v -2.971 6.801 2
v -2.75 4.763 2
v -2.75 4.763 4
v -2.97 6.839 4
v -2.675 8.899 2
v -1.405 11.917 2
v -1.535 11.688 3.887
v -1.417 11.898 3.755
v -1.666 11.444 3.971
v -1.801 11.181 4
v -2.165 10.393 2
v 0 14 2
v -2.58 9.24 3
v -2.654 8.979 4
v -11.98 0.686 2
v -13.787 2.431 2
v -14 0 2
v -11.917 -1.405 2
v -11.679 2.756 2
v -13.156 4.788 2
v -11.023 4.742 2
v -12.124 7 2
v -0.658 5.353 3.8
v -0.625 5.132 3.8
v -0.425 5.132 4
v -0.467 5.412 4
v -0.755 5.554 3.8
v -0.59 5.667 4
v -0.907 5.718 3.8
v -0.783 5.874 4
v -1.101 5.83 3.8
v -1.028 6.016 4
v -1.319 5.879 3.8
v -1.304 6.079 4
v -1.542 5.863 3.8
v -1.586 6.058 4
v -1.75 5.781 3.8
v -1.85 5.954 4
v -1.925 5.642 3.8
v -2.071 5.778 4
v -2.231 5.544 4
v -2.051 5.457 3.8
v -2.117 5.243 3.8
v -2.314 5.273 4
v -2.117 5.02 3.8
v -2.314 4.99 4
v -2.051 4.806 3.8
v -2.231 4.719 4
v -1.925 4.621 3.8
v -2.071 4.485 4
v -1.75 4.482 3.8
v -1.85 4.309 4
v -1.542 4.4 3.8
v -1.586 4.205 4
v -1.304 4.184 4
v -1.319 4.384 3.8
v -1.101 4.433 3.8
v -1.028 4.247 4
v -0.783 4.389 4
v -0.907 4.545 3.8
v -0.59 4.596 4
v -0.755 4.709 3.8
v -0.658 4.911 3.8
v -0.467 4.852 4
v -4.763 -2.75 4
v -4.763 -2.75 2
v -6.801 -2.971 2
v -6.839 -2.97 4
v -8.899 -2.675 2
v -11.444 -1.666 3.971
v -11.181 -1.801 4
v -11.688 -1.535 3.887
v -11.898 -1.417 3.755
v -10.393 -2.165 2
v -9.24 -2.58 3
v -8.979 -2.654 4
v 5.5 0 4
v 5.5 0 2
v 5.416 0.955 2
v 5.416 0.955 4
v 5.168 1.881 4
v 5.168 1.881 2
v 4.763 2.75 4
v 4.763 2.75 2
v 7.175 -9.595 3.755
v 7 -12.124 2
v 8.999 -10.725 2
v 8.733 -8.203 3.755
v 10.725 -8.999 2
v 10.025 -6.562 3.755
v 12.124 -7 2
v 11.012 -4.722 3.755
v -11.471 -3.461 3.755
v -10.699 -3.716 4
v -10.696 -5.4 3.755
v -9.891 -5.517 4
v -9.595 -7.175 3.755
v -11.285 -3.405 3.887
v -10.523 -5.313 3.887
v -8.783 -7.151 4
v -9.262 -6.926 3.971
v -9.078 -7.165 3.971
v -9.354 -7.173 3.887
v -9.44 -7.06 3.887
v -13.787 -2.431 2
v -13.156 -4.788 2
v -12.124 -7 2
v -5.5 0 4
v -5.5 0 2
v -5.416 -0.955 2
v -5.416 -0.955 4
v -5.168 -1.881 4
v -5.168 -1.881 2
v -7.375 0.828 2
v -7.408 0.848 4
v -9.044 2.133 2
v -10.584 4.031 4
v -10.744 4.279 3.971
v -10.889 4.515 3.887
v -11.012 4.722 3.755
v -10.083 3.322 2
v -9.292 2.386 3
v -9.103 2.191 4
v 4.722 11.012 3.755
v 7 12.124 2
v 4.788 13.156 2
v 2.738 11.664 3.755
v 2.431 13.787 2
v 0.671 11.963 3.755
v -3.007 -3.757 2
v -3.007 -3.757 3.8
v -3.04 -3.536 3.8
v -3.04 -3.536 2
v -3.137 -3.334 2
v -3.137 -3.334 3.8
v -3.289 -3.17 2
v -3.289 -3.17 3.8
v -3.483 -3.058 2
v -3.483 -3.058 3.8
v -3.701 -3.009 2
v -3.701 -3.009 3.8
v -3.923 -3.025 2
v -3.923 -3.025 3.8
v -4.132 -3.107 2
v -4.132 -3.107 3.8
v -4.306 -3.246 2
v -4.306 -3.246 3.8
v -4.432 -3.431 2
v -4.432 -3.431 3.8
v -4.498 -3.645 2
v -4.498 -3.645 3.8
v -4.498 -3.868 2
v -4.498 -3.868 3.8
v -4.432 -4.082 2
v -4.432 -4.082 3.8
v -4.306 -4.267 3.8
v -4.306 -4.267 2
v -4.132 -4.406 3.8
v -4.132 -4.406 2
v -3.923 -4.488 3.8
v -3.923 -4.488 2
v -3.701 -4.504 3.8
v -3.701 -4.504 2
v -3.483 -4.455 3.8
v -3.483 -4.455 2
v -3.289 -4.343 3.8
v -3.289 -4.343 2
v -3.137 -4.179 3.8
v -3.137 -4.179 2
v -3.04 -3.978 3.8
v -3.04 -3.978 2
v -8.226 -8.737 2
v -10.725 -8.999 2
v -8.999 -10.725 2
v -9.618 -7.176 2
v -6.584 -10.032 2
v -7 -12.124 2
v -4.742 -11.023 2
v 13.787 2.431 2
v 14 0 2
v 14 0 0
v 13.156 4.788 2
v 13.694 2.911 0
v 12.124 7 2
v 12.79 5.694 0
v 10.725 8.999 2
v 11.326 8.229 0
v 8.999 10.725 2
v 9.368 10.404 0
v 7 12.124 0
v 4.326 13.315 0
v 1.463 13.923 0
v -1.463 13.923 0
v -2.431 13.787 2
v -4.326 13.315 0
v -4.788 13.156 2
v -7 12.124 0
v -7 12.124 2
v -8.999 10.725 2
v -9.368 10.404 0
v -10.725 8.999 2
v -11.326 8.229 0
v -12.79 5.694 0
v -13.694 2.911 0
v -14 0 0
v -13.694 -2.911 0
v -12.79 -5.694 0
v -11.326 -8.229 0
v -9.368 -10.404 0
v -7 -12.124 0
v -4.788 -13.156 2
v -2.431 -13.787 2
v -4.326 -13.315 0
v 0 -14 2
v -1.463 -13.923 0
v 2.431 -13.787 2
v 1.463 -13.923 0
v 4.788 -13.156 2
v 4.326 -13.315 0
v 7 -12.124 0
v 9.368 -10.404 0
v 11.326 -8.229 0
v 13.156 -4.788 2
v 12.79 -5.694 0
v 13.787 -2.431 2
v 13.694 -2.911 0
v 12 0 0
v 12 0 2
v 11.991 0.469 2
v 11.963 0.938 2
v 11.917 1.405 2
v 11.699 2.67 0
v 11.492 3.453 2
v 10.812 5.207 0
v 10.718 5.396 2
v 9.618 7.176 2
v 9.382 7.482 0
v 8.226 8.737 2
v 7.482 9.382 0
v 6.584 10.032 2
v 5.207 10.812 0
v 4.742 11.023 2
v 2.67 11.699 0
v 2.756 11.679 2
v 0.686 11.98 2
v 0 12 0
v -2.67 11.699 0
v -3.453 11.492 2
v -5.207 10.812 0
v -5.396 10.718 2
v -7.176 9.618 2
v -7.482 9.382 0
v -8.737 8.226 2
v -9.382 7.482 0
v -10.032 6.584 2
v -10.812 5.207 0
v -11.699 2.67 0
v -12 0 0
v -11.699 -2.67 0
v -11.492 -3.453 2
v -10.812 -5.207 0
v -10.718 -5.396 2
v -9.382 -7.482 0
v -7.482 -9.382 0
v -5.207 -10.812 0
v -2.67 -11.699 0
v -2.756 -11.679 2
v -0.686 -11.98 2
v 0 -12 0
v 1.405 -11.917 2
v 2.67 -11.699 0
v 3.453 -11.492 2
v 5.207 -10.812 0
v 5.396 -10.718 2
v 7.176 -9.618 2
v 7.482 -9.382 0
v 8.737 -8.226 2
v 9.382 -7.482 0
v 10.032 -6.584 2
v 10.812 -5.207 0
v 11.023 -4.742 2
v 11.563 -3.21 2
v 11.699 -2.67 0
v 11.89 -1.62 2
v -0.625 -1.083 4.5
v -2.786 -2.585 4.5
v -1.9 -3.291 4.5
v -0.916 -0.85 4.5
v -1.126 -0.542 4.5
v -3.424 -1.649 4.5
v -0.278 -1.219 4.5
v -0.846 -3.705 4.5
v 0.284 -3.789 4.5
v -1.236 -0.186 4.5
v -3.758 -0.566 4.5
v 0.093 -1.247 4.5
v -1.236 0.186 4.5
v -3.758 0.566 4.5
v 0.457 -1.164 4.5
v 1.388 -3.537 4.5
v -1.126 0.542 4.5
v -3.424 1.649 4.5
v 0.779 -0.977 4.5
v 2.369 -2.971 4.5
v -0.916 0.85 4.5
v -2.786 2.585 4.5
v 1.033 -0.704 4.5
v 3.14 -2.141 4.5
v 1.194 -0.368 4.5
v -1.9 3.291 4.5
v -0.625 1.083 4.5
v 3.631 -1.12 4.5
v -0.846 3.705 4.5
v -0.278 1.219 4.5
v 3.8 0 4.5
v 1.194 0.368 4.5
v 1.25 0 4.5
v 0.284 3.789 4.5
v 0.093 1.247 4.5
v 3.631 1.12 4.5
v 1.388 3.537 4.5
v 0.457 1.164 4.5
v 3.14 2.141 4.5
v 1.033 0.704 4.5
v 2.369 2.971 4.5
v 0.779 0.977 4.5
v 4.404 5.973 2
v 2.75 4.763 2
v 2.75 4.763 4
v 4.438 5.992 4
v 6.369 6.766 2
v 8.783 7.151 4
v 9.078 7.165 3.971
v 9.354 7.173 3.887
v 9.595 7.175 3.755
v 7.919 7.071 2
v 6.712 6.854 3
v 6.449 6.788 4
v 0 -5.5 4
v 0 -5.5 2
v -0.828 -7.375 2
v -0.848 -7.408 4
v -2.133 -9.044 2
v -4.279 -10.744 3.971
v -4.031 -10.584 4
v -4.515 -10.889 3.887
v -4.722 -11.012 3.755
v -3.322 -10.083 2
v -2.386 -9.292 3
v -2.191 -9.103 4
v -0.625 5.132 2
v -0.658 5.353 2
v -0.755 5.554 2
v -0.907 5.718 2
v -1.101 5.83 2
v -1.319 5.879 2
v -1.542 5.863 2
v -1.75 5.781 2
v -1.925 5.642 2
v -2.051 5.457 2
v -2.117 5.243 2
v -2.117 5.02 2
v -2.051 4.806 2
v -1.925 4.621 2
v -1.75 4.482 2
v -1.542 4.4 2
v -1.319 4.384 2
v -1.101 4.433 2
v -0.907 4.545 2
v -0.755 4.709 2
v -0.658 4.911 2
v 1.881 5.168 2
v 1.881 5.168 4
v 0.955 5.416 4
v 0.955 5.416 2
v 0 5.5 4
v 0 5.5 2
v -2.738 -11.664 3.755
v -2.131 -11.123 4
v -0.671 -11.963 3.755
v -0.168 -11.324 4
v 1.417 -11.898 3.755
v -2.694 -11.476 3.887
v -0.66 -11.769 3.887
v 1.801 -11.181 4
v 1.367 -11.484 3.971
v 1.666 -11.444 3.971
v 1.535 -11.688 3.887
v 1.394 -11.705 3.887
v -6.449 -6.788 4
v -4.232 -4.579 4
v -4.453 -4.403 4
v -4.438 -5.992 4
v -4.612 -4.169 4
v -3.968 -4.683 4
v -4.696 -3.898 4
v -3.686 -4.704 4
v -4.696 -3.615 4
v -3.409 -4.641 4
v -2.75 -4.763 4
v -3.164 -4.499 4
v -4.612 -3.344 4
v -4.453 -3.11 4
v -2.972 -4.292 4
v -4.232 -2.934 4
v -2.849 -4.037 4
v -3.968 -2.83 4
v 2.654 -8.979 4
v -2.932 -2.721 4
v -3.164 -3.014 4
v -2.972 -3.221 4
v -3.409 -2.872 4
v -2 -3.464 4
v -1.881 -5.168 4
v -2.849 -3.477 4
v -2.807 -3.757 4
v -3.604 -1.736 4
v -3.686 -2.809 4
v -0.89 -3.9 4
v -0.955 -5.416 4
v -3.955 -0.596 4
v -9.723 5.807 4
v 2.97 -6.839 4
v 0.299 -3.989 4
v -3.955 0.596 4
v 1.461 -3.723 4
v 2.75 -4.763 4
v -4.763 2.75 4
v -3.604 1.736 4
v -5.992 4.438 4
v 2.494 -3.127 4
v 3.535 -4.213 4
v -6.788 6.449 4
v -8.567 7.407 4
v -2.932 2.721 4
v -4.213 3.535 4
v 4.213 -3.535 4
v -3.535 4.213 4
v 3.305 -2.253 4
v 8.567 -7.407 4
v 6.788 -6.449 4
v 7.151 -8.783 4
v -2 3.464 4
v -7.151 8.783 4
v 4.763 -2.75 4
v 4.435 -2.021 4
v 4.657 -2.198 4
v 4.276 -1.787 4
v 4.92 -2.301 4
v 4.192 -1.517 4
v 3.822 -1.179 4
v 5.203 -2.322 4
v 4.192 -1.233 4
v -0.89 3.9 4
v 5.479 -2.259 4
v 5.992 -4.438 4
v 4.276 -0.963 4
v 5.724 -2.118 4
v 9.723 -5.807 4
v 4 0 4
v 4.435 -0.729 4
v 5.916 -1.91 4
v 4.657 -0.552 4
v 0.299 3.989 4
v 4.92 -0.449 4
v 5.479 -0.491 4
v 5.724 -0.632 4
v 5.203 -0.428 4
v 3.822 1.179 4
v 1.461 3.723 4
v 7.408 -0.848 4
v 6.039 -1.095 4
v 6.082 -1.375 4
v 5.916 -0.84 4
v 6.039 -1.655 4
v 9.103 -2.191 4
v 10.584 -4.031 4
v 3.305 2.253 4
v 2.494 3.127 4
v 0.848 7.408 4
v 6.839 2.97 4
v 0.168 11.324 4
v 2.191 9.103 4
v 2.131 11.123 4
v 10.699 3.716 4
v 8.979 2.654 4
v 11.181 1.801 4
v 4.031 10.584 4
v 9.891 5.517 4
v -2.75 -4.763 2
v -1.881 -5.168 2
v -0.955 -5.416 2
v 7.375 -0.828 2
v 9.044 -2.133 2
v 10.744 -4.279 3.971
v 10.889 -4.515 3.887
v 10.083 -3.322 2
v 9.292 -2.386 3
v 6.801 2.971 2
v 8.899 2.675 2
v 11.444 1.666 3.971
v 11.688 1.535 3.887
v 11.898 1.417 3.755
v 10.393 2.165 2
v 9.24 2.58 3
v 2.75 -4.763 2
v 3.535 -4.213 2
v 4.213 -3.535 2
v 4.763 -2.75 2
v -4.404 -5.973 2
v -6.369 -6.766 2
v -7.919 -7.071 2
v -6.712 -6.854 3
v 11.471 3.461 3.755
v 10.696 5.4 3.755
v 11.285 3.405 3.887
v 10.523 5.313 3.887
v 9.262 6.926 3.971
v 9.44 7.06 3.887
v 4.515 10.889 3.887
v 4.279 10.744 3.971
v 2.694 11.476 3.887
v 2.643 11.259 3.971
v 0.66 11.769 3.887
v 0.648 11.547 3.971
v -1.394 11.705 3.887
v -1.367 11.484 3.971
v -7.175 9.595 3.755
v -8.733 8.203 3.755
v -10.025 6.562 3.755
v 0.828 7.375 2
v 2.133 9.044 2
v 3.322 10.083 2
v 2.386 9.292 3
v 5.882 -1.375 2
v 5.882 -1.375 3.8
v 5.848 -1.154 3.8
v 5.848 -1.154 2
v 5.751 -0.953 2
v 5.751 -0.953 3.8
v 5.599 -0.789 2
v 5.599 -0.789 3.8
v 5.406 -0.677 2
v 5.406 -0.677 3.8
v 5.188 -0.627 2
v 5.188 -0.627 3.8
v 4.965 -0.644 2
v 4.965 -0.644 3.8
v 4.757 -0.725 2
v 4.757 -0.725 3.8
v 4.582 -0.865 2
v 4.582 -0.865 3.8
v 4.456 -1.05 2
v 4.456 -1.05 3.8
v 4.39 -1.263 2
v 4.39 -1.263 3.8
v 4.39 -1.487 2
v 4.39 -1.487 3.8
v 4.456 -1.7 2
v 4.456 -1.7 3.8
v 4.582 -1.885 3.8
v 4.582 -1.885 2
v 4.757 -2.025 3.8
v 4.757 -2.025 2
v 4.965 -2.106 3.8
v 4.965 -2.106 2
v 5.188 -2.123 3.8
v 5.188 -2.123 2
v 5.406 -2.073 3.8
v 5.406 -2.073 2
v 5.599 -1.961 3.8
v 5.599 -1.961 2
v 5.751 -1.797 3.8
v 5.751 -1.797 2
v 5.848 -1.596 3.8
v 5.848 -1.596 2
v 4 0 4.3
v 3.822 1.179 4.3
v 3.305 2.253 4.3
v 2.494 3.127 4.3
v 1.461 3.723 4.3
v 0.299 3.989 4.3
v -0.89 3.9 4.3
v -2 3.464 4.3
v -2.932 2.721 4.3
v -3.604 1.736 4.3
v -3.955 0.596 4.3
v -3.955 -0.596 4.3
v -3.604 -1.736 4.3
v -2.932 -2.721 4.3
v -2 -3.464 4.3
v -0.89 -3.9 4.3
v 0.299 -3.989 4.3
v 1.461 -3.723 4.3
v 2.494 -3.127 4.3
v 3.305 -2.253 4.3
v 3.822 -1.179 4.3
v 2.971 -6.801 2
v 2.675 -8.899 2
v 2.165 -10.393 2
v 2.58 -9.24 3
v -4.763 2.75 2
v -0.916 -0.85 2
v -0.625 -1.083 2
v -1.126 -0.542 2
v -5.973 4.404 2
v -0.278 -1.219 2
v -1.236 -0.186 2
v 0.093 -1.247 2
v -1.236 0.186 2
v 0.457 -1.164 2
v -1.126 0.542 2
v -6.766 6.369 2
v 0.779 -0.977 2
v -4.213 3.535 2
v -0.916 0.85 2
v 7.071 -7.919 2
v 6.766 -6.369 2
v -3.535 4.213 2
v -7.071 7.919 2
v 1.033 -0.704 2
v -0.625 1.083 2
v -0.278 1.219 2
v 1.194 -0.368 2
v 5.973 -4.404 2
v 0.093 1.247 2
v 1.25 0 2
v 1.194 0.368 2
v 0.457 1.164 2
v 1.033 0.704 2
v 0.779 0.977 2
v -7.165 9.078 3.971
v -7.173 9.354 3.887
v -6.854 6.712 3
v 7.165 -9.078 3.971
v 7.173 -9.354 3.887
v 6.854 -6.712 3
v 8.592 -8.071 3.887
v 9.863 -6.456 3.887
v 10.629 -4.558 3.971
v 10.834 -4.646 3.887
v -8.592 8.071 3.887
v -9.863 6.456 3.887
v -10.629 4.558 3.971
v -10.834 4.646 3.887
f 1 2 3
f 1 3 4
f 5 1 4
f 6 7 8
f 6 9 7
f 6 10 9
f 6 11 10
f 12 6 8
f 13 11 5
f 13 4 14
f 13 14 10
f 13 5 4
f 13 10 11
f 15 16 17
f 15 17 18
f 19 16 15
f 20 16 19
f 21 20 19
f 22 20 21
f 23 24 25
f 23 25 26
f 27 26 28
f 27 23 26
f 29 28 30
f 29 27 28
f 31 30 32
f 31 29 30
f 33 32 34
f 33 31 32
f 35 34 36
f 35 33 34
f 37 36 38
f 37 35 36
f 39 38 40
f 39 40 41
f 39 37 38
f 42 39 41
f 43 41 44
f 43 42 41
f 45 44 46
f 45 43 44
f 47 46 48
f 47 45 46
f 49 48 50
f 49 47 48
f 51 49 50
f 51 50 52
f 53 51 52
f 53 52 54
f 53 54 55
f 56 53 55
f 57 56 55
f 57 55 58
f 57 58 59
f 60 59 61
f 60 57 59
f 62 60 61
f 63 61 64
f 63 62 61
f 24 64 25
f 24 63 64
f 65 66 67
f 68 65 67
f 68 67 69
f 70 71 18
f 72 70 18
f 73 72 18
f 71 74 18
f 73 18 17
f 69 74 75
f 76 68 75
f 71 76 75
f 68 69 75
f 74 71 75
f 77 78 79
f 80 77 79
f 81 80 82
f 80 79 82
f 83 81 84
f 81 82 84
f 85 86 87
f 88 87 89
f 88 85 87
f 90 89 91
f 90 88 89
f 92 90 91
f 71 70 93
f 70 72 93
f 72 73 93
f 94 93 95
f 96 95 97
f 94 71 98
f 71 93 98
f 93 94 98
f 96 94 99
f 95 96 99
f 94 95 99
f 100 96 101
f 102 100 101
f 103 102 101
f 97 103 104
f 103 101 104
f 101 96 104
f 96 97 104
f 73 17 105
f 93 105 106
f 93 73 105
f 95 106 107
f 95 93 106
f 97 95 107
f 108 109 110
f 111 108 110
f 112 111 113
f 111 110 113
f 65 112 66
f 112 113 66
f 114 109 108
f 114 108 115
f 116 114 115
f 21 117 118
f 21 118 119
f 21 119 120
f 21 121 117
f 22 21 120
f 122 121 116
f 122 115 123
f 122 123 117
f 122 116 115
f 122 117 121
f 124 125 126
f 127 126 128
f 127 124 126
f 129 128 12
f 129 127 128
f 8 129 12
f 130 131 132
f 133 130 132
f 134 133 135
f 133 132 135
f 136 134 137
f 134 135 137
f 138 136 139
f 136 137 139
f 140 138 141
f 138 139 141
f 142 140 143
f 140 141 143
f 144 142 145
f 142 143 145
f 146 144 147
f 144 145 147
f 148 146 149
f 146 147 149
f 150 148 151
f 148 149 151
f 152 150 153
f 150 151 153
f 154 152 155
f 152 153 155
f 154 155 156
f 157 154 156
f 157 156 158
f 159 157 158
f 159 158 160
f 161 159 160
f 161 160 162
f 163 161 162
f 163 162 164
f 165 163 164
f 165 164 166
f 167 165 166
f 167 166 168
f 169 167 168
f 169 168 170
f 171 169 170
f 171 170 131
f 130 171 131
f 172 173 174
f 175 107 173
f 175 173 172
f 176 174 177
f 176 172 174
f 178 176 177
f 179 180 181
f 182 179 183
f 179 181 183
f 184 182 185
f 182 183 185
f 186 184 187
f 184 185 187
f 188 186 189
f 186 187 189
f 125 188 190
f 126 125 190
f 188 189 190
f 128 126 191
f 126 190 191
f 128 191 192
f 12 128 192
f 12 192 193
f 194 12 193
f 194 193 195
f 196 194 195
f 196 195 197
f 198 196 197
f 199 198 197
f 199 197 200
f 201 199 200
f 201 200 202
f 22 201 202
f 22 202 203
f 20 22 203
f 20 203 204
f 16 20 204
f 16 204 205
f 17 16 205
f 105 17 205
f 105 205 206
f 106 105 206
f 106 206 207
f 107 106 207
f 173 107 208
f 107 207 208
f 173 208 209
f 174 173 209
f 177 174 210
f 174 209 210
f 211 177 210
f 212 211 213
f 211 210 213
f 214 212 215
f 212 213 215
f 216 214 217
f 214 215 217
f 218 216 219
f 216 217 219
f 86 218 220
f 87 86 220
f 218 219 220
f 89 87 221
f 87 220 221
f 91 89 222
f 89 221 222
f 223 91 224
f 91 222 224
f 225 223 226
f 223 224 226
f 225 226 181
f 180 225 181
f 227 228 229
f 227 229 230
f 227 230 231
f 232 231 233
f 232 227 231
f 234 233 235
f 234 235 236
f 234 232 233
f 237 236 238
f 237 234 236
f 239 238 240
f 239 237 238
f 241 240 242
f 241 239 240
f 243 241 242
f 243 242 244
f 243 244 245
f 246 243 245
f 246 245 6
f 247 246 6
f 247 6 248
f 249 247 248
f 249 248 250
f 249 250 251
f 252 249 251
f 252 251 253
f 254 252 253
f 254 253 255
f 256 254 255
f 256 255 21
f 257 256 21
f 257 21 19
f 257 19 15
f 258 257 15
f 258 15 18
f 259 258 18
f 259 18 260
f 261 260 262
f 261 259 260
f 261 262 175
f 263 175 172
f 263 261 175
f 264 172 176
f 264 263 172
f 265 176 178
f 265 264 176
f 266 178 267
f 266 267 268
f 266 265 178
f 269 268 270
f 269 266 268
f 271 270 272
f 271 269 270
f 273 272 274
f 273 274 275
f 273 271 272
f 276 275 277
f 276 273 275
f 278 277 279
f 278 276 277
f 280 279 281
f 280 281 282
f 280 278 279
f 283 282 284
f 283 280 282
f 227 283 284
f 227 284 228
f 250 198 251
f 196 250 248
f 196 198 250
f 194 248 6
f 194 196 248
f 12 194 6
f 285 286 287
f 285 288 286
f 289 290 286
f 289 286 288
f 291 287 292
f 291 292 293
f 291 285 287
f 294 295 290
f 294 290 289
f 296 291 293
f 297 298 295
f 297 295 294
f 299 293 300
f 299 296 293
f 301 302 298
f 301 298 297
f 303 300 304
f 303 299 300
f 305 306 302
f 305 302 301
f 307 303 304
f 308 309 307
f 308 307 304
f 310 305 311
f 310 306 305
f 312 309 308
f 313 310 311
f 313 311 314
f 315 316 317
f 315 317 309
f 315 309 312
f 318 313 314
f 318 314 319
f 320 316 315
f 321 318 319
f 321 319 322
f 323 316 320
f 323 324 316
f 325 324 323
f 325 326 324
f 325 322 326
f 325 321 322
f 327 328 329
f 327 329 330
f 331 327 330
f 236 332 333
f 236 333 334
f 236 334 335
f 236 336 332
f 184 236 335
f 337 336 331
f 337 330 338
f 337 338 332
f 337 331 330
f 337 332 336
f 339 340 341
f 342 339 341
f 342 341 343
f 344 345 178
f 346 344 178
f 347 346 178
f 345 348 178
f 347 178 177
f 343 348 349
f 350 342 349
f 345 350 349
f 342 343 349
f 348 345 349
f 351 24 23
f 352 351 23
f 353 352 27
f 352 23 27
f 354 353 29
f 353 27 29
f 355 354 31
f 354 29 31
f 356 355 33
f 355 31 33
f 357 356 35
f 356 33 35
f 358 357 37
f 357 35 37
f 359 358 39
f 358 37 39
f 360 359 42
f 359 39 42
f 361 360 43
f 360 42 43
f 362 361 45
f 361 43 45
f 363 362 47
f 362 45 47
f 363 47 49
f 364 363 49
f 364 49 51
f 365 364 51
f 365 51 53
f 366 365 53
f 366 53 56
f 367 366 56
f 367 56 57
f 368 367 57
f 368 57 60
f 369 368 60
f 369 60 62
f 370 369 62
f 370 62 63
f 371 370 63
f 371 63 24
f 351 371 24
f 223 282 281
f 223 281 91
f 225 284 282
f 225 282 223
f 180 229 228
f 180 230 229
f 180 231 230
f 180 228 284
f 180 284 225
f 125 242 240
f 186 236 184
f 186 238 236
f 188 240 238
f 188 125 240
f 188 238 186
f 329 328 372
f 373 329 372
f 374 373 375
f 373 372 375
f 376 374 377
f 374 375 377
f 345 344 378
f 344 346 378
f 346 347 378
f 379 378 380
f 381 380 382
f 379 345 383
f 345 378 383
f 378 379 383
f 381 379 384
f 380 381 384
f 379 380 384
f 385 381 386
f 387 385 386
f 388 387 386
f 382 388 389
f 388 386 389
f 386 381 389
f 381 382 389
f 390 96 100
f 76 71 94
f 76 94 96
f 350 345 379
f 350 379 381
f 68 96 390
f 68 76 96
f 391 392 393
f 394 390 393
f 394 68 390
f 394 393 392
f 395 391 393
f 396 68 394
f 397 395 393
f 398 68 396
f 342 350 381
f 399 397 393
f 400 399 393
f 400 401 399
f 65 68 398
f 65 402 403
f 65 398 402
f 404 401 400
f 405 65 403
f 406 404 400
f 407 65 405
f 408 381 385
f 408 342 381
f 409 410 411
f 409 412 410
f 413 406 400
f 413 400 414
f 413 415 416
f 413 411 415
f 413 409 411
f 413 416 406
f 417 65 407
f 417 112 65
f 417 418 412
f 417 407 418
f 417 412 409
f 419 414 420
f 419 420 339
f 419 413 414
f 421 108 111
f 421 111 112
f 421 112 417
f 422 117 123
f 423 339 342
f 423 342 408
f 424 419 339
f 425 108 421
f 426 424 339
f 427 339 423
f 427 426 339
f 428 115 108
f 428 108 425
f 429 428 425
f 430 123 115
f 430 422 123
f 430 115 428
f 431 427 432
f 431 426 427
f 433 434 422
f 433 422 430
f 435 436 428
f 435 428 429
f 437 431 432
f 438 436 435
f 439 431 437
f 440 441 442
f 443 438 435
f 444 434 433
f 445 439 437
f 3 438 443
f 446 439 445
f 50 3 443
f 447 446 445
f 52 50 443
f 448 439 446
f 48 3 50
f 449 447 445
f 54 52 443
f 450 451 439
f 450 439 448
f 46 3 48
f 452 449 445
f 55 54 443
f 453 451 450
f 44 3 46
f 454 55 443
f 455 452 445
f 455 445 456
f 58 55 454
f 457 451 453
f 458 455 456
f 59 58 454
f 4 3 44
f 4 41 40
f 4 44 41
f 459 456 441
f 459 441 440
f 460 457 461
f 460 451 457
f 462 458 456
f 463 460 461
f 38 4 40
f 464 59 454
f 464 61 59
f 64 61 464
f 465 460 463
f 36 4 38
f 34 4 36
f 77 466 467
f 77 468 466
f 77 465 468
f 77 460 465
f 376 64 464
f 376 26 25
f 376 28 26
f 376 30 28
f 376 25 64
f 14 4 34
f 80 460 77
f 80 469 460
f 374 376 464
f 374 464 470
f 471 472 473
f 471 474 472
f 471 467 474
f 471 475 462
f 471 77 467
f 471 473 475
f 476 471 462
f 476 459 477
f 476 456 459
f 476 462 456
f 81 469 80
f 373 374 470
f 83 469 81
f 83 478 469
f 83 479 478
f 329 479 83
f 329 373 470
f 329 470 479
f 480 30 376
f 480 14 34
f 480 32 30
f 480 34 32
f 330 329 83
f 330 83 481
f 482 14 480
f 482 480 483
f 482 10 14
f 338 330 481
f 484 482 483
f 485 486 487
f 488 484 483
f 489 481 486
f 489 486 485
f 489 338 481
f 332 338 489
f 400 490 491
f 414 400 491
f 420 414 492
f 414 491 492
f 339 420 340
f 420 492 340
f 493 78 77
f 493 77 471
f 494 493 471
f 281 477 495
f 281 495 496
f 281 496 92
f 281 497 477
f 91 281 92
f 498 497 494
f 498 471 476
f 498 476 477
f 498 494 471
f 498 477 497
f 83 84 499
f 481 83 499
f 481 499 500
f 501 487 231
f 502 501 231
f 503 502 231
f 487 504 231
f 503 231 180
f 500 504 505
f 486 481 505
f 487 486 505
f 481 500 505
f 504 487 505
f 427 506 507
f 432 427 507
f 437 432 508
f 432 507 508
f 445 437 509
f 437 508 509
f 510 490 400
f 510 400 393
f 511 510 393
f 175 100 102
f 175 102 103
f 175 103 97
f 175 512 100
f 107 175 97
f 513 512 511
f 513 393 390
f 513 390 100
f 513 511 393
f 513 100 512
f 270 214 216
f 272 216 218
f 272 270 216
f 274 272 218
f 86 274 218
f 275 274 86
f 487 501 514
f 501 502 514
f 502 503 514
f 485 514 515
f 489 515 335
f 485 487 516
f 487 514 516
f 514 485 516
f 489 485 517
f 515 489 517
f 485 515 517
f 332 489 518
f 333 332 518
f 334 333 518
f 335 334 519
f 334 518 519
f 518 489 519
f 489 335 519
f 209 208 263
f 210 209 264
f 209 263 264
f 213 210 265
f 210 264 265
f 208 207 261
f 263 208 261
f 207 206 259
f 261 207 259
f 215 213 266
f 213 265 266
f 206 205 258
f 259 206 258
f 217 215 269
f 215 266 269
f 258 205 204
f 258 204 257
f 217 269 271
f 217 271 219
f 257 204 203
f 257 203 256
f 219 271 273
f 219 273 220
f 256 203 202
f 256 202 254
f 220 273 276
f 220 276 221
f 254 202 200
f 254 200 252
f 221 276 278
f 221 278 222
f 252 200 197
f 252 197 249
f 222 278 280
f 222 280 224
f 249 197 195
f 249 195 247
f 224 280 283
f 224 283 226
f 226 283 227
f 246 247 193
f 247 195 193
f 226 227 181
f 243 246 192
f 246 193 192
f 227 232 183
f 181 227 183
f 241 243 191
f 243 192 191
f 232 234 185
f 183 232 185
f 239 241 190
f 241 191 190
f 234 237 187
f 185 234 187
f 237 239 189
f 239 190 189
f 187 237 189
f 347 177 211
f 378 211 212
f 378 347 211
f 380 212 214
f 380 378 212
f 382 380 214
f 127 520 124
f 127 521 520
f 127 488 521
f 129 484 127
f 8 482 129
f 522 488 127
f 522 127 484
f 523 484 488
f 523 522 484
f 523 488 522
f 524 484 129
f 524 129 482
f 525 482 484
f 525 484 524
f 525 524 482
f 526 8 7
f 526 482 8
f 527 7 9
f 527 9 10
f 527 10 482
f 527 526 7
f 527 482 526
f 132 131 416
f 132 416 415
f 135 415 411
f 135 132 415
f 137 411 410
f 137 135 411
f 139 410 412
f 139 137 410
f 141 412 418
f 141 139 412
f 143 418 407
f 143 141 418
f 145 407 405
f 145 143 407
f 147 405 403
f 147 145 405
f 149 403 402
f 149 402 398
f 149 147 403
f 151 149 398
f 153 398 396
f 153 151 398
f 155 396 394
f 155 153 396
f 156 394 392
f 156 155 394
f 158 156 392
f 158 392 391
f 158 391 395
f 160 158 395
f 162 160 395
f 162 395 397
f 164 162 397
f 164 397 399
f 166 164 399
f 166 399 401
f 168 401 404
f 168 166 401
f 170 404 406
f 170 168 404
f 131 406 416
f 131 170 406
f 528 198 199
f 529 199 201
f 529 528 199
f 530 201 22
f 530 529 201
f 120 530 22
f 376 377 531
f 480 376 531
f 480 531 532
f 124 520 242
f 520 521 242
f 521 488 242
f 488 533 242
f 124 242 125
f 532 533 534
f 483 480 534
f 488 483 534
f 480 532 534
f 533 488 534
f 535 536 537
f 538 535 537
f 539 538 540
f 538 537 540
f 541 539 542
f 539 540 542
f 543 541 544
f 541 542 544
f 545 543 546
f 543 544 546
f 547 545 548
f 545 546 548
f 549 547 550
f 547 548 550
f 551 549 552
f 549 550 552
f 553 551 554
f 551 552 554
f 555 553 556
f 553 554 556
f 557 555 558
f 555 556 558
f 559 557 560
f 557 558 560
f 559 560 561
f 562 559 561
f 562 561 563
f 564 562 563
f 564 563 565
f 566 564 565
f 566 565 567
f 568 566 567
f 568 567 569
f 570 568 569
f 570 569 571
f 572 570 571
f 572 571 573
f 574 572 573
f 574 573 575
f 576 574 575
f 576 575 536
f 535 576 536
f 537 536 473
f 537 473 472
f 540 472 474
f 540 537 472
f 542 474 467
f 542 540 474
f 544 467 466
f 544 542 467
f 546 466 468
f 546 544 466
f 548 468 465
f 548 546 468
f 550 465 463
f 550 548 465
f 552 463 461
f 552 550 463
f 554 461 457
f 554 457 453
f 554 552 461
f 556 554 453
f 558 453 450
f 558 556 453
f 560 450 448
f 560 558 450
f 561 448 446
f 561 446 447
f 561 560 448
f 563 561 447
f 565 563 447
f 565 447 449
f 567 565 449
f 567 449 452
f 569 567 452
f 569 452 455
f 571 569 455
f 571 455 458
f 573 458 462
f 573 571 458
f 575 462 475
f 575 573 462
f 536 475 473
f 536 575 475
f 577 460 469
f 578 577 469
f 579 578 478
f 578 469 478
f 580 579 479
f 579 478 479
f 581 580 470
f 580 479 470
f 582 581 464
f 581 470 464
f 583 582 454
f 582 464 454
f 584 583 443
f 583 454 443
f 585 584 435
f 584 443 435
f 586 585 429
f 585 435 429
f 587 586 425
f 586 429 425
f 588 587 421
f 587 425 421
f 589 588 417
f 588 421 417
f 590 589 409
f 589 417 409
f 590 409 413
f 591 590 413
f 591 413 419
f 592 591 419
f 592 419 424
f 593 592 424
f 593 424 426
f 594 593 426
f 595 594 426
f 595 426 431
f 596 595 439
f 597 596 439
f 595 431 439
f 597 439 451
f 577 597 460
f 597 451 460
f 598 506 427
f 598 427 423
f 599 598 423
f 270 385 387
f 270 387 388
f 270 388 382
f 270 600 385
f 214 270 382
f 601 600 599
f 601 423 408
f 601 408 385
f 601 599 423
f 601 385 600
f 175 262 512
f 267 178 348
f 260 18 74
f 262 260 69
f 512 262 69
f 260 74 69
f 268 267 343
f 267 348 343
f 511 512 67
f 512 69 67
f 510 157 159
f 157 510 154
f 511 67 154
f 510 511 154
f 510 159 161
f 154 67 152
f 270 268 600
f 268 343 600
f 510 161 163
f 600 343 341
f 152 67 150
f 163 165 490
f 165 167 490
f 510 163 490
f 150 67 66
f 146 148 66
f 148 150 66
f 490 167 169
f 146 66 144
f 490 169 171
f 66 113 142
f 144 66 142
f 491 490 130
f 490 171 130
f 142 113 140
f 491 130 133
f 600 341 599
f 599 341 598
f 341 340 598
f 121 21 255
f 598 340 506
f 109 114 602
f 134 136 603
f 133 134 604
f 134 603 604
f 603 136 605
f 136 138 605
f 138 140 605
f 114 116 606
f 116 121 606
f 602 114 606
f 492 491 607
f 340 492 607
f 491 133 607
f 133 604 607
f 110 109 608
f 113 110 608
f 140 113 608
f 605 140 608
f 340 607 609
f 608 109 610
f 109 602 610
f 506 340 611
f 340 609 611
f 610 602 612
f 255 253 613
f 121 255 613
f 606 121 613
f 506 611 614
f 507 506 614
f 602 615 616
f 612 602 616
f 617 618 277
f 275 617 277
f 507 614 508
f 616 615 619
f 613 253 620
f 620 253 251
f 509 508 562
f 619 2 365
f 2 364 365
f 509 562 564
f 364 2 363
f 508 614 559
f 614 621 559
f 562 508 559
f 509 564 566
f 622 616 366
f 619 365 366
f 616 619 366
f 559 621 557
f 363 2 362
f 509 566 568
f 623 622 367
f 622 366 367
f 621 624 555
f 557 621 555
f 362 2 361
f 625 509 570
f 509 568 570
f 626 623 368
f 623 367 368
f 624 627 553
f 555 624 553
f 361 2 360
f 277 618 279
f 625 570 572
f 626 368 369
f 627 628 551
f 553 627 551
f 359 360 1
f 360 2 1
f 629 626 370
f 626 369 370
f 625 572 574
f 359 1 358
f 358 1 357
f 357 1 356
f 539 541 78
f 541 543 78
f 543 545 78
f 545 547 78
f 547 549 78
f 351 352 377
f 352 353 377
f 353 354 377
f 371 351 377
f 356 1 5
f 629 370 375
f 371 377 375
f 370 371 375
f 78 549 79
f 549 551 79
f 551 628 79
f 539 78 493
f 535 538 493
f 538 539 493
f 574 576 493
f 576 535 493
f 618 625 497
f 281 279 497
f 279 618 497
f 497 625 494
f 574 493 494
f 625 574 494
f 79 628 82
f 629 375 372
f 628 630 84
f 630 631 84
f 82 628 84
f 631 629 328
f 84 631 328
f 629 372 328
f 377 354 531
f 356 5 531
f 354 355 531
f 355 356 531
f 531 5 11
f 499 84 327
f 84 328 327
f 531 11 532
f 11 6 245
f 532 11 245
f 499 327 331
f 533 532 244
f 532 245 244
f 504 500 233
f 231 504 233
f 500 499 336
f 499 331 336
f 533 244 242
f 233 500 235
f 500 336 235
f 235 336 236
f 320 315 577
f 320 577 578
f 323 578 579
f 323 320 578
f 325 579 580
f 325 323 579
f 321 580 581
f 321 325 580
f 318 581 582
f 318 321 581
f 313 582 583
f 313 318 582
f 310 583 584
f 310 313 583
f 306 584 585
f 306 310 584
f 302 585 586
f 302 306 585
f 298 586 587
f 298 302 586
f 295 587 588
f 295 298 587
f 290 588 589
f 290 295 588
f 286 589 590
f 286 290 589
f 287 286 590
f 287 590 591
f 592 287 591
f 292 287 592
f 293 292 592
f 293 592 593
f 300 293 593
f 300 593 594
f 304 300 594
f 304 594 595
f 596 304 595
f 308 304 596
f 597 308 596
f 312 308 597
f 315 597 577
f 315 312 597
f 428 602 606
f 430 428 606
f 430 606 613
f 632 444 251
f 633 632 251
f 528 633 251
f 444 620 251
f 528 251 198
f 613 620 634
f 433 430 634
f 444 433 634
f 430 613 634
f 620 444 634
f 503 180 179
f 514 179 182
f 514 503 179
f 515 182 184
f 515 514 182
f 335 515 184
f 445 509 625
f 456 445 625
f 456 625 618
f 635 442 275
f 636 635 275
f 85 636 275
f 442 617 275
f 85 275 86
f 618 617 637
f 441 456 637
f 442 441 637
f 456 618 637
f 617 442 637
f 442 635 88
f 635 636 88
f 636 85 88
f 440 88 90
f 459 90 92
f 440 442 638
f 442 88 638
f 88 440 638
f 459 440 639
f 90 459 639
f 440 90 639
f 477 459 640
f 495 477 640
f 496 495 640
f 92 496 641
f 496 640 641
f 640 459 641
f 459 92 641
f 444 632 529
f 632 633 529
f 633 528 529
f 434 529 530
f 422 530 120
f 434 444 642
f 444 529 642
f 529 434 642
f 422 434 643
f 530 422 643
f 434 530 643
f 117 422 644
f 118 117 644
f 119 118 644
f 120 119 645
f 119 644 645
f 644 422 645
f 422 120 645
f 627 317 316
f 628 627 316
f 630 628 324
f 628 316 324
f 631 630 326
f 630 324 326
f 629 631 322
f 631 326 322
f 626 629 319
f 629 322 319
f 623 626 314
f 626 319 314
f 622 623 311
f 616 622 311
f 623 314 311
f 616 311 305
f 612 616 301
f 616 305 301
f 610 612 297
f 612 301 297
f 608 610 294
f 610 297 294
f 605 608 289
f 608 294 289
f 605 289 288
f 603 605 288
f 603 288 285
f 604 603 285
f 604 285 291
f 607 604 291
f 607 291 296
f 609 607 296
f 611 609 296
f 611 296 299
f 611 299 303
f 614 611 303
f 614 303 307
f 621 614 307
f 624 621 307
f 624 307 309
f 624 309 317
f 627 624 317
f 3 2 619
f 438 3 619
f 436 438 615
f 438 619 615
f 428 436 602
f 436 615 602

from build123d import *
from OCP.BRepFilletAPI import BRepFilletAPI_MakeChamfer

# Parameters (mm, degrees)
SKETCH1_R           = 14
SKETCH1_R_2         = 12
BOSS_EXTRUDE1_DEPTH = 2
BOSS_EXTRUDE2_DEPTH = 2
CHAMFER1_SIZE       = 2
CHAMFER1_SIZE_2     = 2.300736814
FILLET1_R           = 1
SKETCH3_R           = 4
BOSS_EXTRUDE3_DEPTH = 0.5
CHAMFER2_SIZE       = 0.2
CUT_EXTRUDE1_REACH  = 22.199
SKETCH4_R           = 0.75
CHAMFER3_SIZE       = 0.2
SKETCH5_R           = 1.25
CUT_EXTRUDE2_DEPTH  = 10


with BuildPart() as part:
    # Sketch1 → Boss-Extrude1 (new body)
    with BuildSketch(Plane.XY):
        Circle(SKETCH1_R)
        Circle(SKETCH1_R_2, mode=Mode.SUBTRACT)
    extrude(amount=BOSS_EXTRUDE1_DEPTH)

    # Sketch2 → Boss-Extrude2 (add)
    with BuildSketch(Plane.XY.offset(2)):
        with BuildLine():
            ThreePointArc((-2.75, 4.763139721), (-3.889087297, 3.889087297), (-4.763139721, 2.75))
            add(Edge.make_bspline(
                [(-4.763139721, 2.75), (-7.826418416, 5.986986658), (-7, 12.124355653)],
                knots=[0.363335237, 0.363335237, 0.363335237, 1, 1, 1], degree=2))
            ThreePointArc((-7, 12.124355653), (-9.899494937, 9.899494937), (-12.124355653, 7))
            add(Edge.make_bspline(
                [(-5.5, 0), (-9.771370498, 1.27167333), (-12.124355653, 7)],
                knots=[0.363335237, 0.363335237, 0.363335237, 1, 1, 1], degree=2))
            ThreePointArc((-5.5, 0), (-5.312592045, -1.423504748), (-4.763139721, -2.75))
            add(Edge.make_bspline(
                [(-4.763139721, -2.75), (-9.098091746, -3.78438384), (-14, 0)],
                knots=[0.363335237, 0.363335237, 0.363335237, 1, 1, 1], degree=2))
            ThreePointArc((-14, 0), (-13.522961568, -3.623466631), (-12.124355653, -7))
            add(Edge.make_bspline(
                [(-2.75, -4.763139721), (-5.986986658, -7.826418416), (-12.124355653, -7)],
                knots=[0.363335237, 0.363335237, 0.363335237, 1, 1, 1], degree=2))
            ThreePointArc((-2.75, -4.763139721), (-1.423504748, -5.312592045), (0, -5.5))
            add(Edge.make_bspline(
                [(0, -5.5), (-1.27167333, -9.771370498), (-7, -12.124355653)],
                knots=[0.363335237, 0.363335237, 0.363335237, 1, 1, 1], degree=2))
            ThreePointArc((-7, -12.124355653), (-3.623466631, -13.522961568), (0, -14))
            add(Edge.make_bspline(
                [(2.75, -4.763139721), (3.78438384, -9.098091746), (0, -14)],
                knots=[0.363335237, 0.363335237, 0.363335237, 1, 1, 1], degree=2))
            ThreePointArc((2.75, -4.763139721), (3.889087297, -3.889087297), (4.763139721, -2.75))
            add(Edge.make_bspline(
                [(4.763139721, -2.75), (7.826418416, -5.986986658), (7, -12.124355653)],
                knots=[0.363335237, 0.363335237, 0.363335237, 1, 1, 1], degree=2))
            ThreePointArc((7, -12.124355653), (9.899494937, -9.899494937), (12.124355653, -7))
            add(Edge.make_bspline(
                [(5.5, 0), (9.771370498, -1.27167333), (12.124355653, -7)],
                knots=[0.363335237, 0.363335237, 0.363335237, 1, 1, 1], degree=2))
            ThreePointArc((5.5, 0), (5.312592045, 1.423504748), (4.763139721, 2.75))
            add(Edge.make_bspline(
                [(4.763139721, 2.75), (9.098091746, 3.78438384), (14, 0)],
                knots=[0.363335237, 0.363335237, 0.363335237, 1, 1, 1], degree=2))
            ThreePointArc((14, 0), (13.522961568, 3.623466631), (12.124355653, 7))
            add(Edge.make_bspline(
                [(2.75, 4.763139721), (5.986986658, 7.826418416), (12.124355653, 7)],
                knots=[0.363335237, 0.363335237, 0.363335237, 1, 1, 1], degree=2))
            ThreePointArc((2.75, 4.763139721), (1.423504748, 5.312592045), (0, 5.5))
            add(Edge.make_bspline(
                [(0, 5.5), (1.27167333, 9.771370498), (7, 12.124355653)],
                knots=[0.363335237, 0.363335237, 0.363335237, 1, 1, 1], degree=2))
            ThreePointArc((7, 12.124355653), (3.623466631, 13.522961568), (0, 14))
            add(Edge.make_bspline(
                [(-2.75, 4.763139721), (-3.78438384, 9.098091746), (0, 14)],
                knots=[0.363335237, 0.363335237, 0.363335237, 1, 1, 1], degree=2))
        make_face()
    extrude(amount=BOSS_EXTRUDE2_DEPTH)

    # Chamfer1
    chamfer1_edges_1 = [part.edges().sort_by_distance(p)[0] for p in [
        (-9.899494937, 9.899494937, 4),
    ]]
    chamfer1_side_1 = [part.faces().sort_by_distance(p)[0] for p in [
        (-9.899494937, 9.899494937, 3.96),
    ]]
    chamfer1_edges_2 = [part.edges().sort_by_distance(p)[0] for p in [
        (-13.522961568, -3.623466631, 4),
    ]]
    chamfer1_side_2 = [part.faces().sort_by_distance(p)[0] for p in [
        (-13.522961568, -3.623466631, 3.96),
    ]]
    chamfer1_edges_3 = [part.edges().sort_by_distance(p)[0] for p in [
        (13.522961568, 3.623466631, 4),
    ]]
    chamfer1_side_3 = [part.faces().sort_by_distance(p)[0] for p in [
        (13.522961568, 3.623466631, 3.96),
    ]]
    chamfer1_edges_4 = [part.edges().sort_by_distance(p)[0] for p in [
        (3.623466631, 13.522961568, 4),
    ]]
    chamfer1_side_4 = [part.faces().sort_by_distance(p)[0] for p in [
        (3.623466631, 13.522961568, 3.96),
    ]]
    chamfer1_edges_5 = [part.edges().sort_by_distance(p)[0] for p in [
        (-3.623466631, -13.522961568, 4),
    ]]
    chamfer1_side_5 = [part.faces().sort_by_distance(p)[0] for p in [
        (-3.623466631, -13.522961568, 3.96),
    ]]
    chamfer1_edges_6 = [part.edges().sort_by_distance(p)[0] for p in [
        (9.899494937, -9.899494937, 4),
    ]]
    chamfer1_side_6 = [part.faces().sort_by_distance(p)[0] for p in [
        (9.899494937, -9.899494937, 3.96),
    ]]
    chamfer1 = BRepFilletAPI_MakeChamfer(part.part.solid().wrapped)
    for e in chamfer1_edges_1:
        chamfer1.Add(CHAMFER1_SIZE - 0.0001, CHAMFER1_SIZE_2 - 0.0001, e.wrapped, chamfer1_side_1[0].wrapped)
    for e in chamfer1_edges_2:
        chamfer1.Add(CHAMFER1_SIZE - 0.0001, CHAMFER1_SIZE_2 - 0.0001, e.wrapped, chamfer1_side_2[0].wrapped)
    for e in chamfer1_edges_3:
        chamfer1.Add(CHAMFER1_SIZE - 0.0001, CHAMFER1_SIZE_2 - 0.0001, e.wrapped, chamfer1_side_3[0].wrapped)
    for e in chamfer1_edges_4:
        chamfer1.Add(CHAMFER1_SIZE - 0.0001, CHAMFER1_SIZE_2 - 0.0001, e.wrapped, chamfer1_side_4[0].wrapped)
    for e in chamfer1_edges_5:
        chamfer1.Add(CHAMFER1_SIZE - 0.0001, CHAMFER1_SIZE_2 - 0.0001, e.wrapped, chamfer1_side_5[0].wrapped)
    for e in chamfer1_edges_6:
        chamfer1.Add(CHAMFER1_SIZE - 0.0001, CHAMFER1_SIZE_2 - 0.0001, e.wrapped, chamfer1_side_6[0].wrapped)
    add(Compound.cast(chamfer1.Shape()), mode=Mode.REPLACE)  # a hair under: the kernel refuses the full size

    # Fillet1
    fillet1_edges = [part.edges().sort_by_distance(p)[0] for p in [
        (10.785366658, 4.533317219, 4),
        (9.318651204, -7.073742906, 4),
        (-1.466715454, -11.607060125, 4),
        (-10.785366658, -4.533317219, 4),
        (-9.318651204, 7.073742906, 4),
        (1.466715454, 11.607060125, 4),
    ]]
    fillet(fillet1_edges, radius=FILLET1_R)

    # Sketch3 → Boss-Extrude3 (add)
    with BuildSketch(Plane.XY.offset(4)):
        Circle(SKETCH3_R)
    extrude(amount=BOSS_EXTRUDE3_DEPTH)

    # Chamfer2
    chamfer2_edges = [part.edges().sort_by_distance(p)[0] for p in [
        (-4, 0, 4.5),
    ]]
    chamfer(chamfer2_edges, length=CHAMFER2_SIZE)

    # Sketch4 → Cut-Extrude1 (cut, up to next)
    with BuildSketch(Plane.XY.offset(4), mode=Mode.PRIVATE) as cut_extrude1_sk1:
        with Locations((-1.375, 5.13156986)):
            Circle(SKETCH4_R)
    cut_extrude1_tool1 = extrude(cut_extrude1_sk1.sketch, amount=-CUT_EXTRUDE1_REACH, mode=Mode.PRIVATE) & part.part
    # Sketch4 → Cut-Extrude1 (cut, up to next)
    with BuildSketch(Plane.XY.offset(4), mode=Mode.PRIVATE) as cut_extrude1_sk2:
        with Locations((5.13156986, -1.375)):
            Circle(SKETCH4_R)
    cut_extrude1_tool2 = extrude(cut_extrude1_sk2.sketch, amount=-CUT_EXTRUDE1_REACH, mode=Mode.PRIVATE) & part.part
    # Sketch4 → Cut-Extrude1 (cut, up to next)
    with BuildSketch(Plane.XY.offset(4), mode=Mode.PRIVATE) as cut_extrude1_sk3:
        with Locations((-3.75656986, -3.75656986)):
            Circle(SKETCH4_R)
    cut_extrude1_tool3 = extrude(cut_extrude1_sk3.sketch, amount=-CUT_EXTRUDE1_REACH, mode=Mode.PRIVATE) & part.part
    add(cut_extrude1_tool1.solids().sort_by_distance((-1.375, 5.13157, 4))[0], mode=Mode.SUBTRACT)
    add(cut_extrude1_tool2.solids().sort_by_distance((5.13157, -1.375, 4))[0], mode=Mode.SUBTRACT)
    add(cut_extrude1_tool3.solids().sort_by_distance((-3.75657, -3.75657, 4))[0], mode=Mode.SUBTRACT)

    # Chamfer3
    chamfer3_edges = [part.edges().sort_by_distance(p)[0] for p in [
        (-2.125, 5.13156986, 4),
        (4.38156986, -1.375, 4),
        (-4.50656986, -3.75656986, 4),
    ]]
    chamfer(chamfer3_edges, length=CHAMFER3_SIZE)

    # Sketch5 → Cut-Extrude2 (cut)
    with BuildSketch(Plane.XY.offset(4.5)):
        Circle(SKETCH5_R)
    extrude(amount=-CUT_EXTRUDE2_DEPTH, mode=Mode.SUBTRACT)


solid = part.part
